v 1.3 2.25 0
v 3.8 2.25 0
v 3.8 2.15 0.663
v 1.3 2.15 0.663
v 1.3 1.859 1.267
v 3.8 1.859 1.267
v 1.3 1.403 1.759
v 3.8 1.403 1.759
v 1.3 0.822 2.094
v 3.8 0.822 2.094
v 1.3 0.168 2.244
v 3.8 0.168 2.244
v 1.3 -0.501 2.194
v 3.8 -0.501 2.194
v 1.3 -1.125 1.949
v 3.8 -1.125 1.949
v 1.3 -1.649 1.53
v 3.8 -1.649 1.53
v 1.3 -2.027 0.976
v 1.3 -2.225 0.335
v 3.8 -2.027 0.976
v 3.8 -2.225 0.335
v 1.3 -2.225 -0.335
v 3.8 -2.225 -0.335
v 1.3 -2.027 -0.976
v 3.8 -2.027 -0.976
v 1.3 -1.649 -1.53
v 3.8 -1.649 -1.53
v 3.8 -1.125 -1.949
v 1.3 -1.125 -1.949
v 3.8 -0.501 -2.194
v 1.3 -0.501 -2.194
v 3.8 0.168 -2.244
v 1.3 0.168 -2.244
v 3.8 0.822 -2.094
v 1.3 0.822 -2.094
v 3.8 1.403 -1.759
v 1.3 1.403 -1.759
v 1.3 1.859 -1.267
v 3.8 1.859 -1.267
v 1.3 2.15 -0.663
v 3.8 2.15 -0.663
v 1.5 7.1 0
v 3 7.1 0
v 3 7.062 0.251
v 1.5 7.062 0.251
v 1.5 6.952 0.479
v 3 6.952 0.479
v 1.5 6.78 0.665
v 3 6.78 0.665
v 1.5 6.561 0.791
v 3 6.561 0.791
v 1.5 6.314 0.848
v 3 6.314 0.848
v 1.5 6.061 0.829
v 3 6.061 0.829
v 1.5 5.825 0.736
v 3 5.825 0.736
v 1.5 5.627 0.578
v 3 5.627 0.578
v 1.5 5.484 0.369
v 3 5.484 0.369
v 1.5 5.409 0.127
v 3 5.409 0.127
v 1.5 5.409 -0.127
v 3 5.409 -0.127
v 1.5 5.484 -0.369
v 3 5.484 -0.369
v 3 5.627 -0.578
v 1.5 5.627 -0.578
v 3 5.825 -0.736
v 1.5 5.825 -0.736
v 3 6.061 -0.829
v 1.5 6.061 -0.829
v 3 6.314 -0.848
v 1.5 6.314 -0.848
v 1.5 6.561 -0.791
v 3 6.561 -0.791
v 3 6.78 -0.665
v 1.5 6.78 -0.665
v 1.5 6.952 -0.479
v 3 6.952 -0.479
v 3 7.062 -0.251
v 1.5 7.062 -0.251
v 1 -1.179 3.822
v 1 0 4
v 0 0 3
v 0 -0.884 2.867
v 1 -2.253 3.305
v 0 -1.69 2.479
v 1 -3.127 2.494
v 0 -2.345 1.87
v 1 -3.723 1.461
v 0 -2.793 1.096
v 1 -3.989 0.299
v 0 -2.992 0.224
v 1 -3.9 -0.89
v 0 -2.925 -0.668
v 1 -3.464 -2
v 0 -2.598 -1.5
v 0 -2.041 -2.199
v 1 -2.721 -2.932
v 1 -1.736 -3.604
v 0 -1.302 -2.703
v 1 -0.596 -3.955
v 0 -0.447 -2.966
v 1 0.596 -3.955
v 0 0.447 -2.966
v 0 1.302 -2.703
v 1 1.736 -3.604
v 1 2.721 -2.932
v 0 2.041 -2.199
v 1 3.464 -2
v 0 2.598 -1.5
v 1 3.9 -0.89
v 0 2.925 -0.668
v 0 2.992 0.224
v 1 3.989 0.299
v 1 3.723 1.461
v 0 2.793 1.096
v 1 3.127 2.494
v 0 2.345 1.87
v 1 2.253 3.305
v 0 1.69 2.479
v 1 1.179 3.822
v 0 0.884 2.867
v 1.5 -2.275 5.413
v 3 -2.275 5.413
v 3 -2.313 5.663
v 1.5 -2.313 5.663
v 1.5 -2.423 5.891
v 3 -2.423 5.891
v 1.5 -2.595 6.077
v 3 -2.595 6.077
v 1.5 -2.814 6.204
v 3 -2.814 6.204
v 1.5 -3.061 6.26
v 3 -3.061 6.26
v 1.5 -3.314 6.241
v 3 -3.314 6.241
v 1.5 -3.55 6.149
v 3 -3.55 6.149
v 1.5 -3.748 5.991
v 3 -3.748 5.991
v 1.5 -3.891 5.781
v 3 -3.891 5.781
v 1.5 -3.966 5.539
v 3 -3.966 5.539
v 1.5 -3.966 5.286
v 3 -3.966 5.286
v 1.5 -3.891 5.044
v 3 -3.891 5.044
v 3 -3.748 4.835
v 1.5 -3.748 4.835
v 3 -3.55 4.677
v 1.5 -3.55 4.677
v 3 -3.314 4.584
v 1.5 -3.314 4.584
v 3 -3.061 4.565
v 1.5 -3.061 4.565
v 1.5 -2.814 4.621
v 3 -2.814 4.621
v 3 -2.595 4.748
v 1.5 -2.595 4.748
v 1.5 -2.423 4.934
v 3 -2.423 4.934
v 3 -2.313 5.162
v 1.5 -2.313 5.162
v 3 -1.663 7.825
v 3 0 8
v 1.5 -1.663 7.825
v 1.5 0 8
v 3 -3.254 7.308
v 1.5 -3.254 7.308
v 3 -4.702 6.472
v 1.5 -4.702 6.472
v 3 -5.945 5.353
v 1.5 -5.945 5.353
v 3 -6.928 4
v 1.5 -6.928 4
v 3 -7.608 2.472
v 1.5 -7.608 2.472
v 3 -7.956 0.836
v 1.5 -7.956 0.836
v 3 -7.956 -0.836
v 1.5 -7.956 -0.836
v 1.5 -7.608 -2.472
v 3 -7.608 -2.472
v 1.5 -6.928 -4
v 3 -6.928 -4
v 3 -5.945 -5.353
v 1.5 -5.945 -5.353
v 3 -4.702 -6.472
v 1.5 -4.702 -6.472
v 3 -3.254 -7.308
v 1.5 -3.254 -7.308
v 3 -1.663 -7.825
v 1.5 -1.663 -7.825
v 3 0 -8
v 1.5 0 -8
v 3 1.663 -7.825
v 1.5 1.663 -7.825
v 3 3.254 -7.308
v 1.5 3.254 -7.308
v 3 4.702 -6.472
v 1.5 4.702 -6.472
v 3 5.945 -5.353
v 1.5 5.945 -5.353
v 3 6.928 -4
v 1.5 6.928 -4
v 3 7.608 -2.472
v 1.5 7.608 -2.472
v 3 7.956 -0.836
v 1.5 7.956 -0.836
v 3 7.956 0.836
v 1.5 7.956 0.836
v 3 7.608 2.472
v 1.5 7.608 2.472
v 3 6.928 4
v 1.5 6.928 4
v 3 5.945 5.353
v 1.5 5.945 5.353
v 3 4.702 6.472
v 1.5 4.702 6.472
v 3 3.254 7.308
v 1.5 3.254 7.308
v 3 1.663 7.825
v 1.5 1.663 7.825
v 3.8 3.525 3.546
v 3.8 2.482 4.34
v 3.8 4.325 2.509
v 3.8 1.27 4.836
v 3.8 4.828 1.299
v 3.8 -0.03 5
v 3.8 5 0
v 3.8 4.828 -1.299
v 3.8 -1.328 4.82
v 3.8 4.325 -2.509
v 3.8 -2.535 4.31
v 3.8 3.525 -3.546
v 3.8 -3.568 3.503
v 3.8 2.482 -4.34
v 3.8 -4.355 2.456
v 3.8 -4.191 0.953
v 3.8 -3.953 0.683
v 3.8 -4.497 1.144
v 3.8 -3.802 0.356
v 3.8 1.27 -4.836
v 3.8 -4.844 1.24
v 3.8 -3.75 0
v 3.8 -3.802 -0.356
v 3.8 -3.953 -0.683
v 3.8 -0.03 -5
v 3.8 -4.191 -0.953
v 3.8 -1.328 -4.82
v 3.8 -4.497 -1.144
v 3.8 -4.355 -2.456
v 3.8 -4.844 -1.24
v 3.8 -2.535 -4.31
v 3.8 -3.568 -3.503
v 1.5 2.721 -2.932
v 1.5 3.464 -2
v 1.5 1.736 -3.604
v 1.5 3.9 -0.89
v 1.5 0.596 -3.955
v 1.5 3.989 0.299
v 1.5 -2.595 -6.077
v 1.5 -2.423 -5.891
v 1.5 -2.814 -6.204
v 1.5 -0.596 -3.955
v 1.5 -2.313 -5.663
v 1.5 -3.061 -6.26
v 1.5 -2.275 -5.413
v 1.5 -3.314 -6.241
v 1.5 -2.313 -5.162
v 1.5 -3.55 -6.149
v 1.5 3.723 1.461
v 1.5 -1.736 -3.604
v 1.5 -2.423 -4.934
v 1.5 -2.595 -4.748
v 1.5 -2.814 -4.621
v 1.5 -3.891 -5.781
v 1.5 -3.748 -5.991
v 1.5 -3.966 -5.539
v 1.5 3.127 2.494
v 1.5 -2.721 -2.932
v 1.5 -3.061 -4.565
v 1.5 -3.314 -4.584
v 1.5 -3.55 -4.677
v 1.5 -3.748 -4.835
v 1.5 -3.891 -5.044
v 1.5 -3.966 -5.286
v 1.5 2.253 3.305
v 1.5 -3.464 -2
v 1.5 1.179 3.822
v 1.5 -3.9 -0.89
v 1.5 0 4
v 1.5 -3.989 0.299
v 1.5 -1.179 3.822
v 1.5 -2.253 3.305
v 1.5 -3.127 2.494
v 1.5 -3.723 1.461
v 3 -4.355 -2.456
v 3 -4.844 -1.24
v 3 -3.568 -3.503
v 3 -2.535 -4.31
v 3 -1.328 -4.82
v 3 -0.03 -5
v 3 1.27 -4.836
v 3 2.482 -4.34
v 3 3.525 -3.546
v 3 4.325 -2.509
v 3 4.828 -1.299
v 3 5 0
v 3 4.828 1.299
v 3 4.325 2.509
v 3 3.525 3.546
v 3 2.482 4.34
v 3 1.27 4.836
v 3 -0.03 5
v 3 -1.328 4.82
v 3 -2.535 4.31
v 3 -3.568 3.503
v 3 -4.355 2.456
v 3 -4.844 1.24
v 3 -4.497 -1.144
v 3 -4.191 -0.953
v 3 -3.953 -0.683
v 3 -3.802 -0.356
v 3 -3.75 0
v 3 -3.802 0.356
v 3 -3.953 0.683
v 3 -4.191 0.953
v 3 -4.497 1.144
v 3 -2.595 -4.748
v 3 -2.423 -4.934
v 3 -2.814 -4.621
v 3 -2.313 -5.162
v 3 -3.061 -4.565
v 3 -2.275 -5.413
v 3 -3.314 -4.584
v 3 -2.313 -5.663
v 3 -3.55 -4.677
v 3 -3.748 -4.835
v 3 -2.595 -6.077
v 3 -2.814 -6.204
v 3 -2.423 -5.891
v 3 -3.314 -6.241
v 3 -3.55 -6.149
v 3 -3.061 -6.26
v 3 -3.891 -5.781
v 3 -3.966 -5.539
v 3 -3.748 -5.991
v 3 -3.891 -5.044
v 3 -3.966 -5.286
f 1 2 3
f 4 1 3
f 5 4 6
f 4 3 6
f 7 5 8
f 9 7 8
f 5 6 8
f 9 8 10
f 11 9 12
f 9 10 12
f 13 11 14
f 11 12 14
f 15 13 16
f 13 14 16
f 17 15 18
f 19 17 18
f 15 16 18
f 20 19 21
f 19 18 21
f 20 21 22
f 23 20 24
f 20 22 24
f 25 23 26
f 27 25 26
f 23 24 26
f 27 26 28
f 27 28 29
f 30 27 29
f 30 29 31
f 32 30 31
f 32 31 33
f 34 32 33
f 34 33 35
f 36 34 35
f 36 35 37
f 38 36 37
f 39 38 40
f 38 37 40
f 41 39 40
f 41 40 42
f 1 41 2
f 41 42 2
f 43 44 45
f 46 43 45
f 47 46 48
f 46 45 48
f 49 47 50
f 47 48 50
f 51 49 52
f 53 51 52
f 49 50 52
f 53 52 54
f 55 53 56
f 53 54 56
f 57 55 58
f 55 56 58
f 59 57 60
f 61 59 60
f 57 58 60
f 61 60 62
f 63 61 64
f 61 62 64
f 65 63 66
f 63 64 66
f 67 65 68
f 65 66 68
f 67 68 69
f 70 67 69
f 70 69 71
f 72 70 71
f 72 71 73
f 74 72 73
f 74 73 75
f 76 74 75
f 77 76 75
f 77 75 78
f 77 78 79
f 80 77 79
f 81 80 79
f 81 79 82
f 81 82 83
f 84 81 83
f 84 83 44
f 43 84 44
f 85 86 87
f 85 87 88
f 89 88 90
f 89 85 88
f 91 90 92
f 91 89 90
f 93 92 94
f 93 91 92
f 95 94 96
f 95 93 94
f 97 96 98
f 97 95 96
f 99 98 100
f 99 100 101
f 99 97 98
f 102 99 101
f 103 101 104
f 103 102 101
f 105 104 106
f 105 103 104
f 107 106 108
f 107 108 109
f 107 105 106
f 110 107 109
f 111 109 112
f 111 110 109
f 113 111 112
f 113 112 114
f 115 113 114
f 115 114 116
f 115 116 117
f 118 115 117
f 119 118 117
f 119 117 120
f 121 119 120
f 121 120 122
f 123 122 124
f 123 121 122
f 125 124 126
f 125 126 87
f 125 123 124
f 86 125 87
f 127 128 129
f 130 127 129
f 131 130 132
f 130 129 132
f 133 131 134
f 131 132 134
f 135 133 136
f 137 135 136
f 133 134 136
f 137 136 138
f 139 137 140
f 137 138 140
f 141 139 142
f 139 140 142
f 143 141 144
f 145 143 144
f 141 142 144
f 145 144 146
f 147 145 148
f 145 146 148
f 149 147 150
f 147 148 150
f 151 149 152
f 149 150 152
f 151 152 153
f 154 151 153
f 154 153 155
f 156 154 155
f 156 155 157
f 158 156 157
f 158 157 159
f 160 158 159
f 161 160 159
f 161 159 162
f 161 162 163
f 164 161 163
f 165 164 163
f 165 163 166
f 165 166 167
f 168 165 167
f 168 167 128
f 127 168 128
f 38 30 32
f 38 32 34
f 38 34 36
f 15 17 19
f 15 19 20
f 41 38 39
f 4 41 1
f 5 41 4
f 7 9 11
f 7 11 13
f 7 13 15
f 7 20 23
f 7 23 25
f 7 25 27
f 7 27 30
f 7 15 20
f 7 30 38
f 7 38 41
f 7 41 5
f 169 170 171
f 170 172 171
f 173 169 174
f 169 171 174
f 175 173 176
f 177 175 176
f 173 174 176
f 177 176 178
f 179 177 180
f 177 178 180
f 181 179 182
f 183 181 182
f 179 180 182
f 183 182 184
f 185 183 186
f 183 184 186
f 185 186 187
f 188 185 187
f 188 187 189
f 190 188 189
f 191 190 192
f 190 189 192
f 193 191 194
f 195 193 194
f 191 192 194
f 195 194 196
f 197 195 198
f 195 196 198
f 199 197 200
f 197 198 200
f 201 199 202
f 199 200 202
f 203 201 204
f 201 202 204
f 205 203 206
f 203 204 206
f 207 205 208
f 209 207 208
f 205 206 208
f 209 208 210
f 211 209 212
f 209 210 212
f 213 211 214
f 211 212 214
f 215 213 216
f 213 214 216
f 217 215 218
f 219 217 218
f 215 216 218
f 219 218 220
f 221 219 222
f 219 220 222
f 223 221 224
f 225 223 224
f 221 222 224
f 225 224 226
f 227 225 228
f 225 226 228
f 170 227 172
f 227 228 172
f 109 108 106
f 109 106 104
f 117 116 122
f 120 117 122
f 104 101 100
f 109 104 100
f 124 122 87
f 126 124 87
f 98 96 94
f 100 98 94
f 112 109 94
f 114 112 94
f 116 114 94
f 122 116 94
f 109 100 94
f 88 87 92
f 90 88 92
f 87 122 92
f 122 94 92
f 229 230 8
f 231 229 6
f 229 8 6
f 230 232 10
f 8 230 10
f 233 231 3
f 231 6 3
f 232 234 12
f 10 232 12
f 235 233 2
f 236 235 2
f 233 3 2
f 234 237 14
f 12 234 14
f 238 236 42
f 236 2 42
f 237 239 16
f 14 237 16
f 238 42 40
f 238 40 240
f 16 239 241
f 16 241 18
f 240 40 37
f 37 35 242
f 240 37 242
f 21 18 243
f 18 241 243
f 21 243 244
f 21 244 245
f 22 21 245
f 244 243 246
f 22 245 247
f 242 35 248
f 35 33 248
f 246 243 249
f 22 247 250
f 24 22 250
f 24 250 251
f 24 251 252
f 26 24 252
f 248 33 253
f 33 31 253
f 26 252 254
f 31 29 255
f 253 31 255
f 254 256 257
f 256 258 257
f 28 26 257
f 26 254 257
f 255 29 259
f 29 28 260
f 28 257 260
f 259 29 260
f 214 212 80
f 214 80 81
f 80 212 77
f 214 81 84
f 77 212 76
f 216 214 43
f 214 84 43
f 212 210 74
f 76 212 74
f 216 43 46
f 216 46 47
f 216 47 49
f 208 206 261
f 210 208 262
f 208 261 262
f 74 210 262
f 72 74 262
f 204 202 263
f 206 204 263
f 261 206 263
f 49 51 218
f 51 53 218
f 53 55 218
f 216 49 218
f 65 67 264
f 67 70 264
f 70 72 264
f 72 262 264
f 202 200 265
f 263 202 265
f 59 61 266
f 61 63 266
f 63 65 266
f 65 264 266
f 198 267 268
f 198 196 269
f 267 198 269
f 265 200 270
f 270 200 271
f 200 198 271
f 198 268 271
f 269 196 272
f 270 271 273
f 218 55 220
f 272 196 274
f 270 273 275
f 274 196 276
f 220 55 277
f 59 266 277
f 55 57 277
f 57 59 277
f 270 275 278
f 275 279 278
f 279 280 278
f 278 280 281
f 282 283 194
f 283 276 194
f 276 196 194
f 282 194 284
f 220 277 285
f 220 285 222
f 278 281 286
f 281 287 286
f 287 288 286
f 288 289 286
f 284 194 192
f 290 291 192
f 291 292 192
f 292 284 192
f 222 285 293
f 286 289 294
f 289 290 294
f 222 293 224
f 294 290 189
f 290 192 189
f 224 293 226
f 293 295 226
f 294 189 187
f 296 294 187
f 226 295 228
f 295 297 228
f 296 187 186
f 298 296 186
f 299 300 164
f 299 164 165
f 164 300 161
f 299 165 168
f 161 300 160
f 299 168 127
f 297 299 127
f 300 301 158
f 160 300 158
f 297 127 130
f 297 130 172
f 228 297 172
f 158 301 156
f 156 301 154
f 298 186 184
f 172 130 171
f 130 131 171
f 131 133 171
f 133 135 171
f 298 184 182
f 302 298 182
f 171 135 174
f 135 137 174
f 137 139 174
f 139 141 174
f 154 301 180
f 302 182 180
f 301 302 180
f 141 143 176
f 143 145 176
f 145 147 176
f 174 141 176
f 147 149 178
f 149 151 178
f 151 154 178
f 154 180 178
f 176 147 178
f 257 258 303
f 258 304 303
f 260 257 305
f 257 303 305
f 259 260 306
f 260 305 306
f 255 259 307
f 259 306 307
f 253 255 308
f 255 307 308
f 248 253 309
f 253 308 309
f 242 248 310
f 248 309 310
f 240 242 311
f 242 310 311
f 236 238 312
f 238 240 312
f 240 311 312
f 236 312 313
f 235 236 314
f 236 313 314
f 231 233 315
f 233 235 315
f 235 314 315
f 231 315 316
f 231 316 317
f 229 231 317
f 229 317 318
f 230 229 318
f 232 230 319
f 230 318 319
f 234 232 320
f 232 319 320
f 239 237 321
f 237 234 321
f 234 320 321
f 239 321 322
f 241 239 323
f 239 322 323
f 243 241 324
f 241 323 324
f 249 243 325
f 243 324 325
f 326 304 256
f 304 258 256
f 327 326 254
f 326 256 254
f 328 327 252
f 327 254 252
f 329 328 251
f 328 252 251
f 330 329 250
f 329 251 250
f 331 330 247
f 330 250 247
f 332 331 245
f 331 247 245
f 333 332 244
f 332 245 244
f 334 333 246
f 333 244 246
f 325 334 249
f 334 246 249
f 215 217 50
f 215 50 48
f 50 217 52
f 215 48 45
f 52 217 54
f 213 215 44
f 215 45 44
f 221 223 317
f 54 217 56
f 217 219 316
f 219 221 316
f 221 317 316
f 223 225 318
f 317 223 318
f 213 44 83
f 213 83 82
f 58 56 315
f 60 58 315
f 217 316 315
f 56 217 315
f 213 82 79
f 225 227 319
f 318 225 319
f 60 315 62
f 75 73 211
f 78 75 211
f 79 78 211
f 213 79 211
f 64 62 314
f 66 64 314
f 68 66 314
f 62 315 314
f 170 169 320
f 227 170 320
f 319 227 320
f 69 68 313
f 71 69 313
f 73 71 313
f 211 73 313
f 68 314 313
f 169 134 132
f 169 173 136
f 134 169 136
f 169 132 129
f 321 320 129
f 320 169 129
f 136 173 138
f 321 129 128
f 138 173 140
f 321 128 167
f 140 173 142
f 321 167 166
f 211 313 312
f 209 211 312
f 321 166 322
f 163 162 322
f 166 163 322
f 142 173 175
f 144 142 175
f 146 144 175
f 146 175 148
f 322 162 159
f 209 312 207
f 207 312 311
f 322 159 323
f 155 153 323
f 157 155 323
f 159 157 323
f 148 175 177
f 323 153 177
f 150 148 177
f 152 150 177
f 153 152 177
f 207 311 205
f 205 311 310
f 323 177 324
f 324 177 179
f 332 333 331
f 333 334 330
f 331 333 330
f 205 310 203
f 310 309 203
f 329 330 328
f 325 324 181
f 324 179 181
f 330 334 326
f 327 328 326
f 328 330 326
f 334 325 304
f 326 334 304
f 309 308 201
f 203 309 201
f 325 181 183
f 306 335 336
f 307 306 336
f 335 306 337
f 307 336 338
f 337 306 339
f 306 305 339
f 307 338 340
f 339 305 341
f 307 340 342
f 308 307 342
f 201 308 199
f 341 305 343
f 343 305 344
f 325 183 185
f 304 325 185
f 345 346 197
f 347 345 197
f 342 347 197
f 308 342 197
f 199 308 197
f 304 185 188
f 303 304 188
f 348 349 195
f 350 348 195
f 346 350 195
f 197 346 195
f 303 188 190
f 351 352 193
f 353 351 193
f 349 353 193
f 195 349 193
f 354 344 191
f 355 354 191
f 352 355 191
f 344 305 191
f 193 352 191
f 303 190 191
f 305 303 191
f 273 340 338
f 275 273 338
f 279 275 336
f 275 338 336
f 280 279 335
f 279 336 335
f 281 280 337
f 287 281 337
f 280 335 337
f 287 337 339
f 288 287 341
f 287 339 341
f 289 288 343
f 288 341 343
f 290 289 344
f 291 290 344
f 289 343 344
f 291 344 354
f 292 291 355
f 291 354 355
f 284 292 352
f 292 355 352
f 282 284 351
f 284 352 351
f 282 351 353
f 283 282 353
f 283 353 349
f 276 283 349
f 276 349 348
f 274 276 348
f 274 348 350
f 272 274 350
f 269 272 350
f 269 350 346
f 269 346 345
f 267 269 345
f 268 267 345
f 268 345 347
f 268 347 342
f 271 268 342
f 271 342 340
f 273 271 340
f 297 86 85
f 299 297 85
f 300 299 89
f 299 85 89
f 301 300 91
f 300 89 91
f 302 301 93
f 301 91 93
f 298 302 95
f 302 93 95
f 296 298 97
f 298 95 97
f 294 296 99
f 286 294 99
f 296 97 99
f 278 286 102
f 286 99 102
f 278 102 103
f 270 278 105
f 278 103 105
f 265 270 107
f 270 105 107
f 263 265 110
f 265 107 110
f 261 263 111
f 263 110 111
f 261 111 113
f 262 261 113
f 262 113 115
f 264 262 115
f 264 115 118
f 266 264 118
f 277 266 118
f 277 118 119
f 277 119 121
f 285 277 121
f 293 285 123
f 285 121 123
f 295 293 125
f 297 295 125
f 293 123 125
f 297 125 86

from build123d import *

# Parameters (mm, degrees)
F2_SIZE  = 1
F3_R     = 0.85
F4_DEPTH = 3.001
F5_R     = 1.25
F6_DEPTH = 0.8
F7_R     = 2.25
F8_DEPTH = 2.5


with BuildPart() as f1:
    # F0 (on Front) → F1 (revolve)
    with BuildSketch(Plane.XZ):
        Polygon((0, 4), (0, 0), (3.8, 0), (3.8, 5), (3, 5), (3, 8), (1.5, 8), (1.5, 4), align=None)
    revolve(axis=Axis((1.9, 0, 0), (1, 0, 0)))

    # F2
    f2_edges = [f1.edges().sort_by_distance(p)[0] for p in [
        (0, 0, -4),
    ]]
    chamfer(f2_edges, length=F2_SIZE)

    # F3 (on face) → F4 (cut, through all)
    with BuildSketch(Plane.YZ.offset(3)):
        with Locations((6.25, 0)):
            Circle(F3_R)
        with Locations((-3.125, 5.412659)):
            Circle(F3_R)
        with Locations((-3.125, -5.412659)):
            Circle(F3_R)
    extrude(amount=-F4_DEPTH, mode=Mode.SUBTRACT)

    # F5 (on face) → F6 (cut, through all)
    with BuildSketch(Plane.YZ.offset(3.8)):
        with Locations((-5, 0)):
            Circle(F5_R)
    extrude(amount=-F6_DEPTH, mode=Mode.SUBTRACT)

    # F7 (on face) → F8 (cut)
    with BuildSketch(Plane.YZ.offset(3.8)):
        Circle(F7_R)
    extrude(amount=-F8_DEPTH, mode=Mode.SUBTRACT)


solid = f1.part
